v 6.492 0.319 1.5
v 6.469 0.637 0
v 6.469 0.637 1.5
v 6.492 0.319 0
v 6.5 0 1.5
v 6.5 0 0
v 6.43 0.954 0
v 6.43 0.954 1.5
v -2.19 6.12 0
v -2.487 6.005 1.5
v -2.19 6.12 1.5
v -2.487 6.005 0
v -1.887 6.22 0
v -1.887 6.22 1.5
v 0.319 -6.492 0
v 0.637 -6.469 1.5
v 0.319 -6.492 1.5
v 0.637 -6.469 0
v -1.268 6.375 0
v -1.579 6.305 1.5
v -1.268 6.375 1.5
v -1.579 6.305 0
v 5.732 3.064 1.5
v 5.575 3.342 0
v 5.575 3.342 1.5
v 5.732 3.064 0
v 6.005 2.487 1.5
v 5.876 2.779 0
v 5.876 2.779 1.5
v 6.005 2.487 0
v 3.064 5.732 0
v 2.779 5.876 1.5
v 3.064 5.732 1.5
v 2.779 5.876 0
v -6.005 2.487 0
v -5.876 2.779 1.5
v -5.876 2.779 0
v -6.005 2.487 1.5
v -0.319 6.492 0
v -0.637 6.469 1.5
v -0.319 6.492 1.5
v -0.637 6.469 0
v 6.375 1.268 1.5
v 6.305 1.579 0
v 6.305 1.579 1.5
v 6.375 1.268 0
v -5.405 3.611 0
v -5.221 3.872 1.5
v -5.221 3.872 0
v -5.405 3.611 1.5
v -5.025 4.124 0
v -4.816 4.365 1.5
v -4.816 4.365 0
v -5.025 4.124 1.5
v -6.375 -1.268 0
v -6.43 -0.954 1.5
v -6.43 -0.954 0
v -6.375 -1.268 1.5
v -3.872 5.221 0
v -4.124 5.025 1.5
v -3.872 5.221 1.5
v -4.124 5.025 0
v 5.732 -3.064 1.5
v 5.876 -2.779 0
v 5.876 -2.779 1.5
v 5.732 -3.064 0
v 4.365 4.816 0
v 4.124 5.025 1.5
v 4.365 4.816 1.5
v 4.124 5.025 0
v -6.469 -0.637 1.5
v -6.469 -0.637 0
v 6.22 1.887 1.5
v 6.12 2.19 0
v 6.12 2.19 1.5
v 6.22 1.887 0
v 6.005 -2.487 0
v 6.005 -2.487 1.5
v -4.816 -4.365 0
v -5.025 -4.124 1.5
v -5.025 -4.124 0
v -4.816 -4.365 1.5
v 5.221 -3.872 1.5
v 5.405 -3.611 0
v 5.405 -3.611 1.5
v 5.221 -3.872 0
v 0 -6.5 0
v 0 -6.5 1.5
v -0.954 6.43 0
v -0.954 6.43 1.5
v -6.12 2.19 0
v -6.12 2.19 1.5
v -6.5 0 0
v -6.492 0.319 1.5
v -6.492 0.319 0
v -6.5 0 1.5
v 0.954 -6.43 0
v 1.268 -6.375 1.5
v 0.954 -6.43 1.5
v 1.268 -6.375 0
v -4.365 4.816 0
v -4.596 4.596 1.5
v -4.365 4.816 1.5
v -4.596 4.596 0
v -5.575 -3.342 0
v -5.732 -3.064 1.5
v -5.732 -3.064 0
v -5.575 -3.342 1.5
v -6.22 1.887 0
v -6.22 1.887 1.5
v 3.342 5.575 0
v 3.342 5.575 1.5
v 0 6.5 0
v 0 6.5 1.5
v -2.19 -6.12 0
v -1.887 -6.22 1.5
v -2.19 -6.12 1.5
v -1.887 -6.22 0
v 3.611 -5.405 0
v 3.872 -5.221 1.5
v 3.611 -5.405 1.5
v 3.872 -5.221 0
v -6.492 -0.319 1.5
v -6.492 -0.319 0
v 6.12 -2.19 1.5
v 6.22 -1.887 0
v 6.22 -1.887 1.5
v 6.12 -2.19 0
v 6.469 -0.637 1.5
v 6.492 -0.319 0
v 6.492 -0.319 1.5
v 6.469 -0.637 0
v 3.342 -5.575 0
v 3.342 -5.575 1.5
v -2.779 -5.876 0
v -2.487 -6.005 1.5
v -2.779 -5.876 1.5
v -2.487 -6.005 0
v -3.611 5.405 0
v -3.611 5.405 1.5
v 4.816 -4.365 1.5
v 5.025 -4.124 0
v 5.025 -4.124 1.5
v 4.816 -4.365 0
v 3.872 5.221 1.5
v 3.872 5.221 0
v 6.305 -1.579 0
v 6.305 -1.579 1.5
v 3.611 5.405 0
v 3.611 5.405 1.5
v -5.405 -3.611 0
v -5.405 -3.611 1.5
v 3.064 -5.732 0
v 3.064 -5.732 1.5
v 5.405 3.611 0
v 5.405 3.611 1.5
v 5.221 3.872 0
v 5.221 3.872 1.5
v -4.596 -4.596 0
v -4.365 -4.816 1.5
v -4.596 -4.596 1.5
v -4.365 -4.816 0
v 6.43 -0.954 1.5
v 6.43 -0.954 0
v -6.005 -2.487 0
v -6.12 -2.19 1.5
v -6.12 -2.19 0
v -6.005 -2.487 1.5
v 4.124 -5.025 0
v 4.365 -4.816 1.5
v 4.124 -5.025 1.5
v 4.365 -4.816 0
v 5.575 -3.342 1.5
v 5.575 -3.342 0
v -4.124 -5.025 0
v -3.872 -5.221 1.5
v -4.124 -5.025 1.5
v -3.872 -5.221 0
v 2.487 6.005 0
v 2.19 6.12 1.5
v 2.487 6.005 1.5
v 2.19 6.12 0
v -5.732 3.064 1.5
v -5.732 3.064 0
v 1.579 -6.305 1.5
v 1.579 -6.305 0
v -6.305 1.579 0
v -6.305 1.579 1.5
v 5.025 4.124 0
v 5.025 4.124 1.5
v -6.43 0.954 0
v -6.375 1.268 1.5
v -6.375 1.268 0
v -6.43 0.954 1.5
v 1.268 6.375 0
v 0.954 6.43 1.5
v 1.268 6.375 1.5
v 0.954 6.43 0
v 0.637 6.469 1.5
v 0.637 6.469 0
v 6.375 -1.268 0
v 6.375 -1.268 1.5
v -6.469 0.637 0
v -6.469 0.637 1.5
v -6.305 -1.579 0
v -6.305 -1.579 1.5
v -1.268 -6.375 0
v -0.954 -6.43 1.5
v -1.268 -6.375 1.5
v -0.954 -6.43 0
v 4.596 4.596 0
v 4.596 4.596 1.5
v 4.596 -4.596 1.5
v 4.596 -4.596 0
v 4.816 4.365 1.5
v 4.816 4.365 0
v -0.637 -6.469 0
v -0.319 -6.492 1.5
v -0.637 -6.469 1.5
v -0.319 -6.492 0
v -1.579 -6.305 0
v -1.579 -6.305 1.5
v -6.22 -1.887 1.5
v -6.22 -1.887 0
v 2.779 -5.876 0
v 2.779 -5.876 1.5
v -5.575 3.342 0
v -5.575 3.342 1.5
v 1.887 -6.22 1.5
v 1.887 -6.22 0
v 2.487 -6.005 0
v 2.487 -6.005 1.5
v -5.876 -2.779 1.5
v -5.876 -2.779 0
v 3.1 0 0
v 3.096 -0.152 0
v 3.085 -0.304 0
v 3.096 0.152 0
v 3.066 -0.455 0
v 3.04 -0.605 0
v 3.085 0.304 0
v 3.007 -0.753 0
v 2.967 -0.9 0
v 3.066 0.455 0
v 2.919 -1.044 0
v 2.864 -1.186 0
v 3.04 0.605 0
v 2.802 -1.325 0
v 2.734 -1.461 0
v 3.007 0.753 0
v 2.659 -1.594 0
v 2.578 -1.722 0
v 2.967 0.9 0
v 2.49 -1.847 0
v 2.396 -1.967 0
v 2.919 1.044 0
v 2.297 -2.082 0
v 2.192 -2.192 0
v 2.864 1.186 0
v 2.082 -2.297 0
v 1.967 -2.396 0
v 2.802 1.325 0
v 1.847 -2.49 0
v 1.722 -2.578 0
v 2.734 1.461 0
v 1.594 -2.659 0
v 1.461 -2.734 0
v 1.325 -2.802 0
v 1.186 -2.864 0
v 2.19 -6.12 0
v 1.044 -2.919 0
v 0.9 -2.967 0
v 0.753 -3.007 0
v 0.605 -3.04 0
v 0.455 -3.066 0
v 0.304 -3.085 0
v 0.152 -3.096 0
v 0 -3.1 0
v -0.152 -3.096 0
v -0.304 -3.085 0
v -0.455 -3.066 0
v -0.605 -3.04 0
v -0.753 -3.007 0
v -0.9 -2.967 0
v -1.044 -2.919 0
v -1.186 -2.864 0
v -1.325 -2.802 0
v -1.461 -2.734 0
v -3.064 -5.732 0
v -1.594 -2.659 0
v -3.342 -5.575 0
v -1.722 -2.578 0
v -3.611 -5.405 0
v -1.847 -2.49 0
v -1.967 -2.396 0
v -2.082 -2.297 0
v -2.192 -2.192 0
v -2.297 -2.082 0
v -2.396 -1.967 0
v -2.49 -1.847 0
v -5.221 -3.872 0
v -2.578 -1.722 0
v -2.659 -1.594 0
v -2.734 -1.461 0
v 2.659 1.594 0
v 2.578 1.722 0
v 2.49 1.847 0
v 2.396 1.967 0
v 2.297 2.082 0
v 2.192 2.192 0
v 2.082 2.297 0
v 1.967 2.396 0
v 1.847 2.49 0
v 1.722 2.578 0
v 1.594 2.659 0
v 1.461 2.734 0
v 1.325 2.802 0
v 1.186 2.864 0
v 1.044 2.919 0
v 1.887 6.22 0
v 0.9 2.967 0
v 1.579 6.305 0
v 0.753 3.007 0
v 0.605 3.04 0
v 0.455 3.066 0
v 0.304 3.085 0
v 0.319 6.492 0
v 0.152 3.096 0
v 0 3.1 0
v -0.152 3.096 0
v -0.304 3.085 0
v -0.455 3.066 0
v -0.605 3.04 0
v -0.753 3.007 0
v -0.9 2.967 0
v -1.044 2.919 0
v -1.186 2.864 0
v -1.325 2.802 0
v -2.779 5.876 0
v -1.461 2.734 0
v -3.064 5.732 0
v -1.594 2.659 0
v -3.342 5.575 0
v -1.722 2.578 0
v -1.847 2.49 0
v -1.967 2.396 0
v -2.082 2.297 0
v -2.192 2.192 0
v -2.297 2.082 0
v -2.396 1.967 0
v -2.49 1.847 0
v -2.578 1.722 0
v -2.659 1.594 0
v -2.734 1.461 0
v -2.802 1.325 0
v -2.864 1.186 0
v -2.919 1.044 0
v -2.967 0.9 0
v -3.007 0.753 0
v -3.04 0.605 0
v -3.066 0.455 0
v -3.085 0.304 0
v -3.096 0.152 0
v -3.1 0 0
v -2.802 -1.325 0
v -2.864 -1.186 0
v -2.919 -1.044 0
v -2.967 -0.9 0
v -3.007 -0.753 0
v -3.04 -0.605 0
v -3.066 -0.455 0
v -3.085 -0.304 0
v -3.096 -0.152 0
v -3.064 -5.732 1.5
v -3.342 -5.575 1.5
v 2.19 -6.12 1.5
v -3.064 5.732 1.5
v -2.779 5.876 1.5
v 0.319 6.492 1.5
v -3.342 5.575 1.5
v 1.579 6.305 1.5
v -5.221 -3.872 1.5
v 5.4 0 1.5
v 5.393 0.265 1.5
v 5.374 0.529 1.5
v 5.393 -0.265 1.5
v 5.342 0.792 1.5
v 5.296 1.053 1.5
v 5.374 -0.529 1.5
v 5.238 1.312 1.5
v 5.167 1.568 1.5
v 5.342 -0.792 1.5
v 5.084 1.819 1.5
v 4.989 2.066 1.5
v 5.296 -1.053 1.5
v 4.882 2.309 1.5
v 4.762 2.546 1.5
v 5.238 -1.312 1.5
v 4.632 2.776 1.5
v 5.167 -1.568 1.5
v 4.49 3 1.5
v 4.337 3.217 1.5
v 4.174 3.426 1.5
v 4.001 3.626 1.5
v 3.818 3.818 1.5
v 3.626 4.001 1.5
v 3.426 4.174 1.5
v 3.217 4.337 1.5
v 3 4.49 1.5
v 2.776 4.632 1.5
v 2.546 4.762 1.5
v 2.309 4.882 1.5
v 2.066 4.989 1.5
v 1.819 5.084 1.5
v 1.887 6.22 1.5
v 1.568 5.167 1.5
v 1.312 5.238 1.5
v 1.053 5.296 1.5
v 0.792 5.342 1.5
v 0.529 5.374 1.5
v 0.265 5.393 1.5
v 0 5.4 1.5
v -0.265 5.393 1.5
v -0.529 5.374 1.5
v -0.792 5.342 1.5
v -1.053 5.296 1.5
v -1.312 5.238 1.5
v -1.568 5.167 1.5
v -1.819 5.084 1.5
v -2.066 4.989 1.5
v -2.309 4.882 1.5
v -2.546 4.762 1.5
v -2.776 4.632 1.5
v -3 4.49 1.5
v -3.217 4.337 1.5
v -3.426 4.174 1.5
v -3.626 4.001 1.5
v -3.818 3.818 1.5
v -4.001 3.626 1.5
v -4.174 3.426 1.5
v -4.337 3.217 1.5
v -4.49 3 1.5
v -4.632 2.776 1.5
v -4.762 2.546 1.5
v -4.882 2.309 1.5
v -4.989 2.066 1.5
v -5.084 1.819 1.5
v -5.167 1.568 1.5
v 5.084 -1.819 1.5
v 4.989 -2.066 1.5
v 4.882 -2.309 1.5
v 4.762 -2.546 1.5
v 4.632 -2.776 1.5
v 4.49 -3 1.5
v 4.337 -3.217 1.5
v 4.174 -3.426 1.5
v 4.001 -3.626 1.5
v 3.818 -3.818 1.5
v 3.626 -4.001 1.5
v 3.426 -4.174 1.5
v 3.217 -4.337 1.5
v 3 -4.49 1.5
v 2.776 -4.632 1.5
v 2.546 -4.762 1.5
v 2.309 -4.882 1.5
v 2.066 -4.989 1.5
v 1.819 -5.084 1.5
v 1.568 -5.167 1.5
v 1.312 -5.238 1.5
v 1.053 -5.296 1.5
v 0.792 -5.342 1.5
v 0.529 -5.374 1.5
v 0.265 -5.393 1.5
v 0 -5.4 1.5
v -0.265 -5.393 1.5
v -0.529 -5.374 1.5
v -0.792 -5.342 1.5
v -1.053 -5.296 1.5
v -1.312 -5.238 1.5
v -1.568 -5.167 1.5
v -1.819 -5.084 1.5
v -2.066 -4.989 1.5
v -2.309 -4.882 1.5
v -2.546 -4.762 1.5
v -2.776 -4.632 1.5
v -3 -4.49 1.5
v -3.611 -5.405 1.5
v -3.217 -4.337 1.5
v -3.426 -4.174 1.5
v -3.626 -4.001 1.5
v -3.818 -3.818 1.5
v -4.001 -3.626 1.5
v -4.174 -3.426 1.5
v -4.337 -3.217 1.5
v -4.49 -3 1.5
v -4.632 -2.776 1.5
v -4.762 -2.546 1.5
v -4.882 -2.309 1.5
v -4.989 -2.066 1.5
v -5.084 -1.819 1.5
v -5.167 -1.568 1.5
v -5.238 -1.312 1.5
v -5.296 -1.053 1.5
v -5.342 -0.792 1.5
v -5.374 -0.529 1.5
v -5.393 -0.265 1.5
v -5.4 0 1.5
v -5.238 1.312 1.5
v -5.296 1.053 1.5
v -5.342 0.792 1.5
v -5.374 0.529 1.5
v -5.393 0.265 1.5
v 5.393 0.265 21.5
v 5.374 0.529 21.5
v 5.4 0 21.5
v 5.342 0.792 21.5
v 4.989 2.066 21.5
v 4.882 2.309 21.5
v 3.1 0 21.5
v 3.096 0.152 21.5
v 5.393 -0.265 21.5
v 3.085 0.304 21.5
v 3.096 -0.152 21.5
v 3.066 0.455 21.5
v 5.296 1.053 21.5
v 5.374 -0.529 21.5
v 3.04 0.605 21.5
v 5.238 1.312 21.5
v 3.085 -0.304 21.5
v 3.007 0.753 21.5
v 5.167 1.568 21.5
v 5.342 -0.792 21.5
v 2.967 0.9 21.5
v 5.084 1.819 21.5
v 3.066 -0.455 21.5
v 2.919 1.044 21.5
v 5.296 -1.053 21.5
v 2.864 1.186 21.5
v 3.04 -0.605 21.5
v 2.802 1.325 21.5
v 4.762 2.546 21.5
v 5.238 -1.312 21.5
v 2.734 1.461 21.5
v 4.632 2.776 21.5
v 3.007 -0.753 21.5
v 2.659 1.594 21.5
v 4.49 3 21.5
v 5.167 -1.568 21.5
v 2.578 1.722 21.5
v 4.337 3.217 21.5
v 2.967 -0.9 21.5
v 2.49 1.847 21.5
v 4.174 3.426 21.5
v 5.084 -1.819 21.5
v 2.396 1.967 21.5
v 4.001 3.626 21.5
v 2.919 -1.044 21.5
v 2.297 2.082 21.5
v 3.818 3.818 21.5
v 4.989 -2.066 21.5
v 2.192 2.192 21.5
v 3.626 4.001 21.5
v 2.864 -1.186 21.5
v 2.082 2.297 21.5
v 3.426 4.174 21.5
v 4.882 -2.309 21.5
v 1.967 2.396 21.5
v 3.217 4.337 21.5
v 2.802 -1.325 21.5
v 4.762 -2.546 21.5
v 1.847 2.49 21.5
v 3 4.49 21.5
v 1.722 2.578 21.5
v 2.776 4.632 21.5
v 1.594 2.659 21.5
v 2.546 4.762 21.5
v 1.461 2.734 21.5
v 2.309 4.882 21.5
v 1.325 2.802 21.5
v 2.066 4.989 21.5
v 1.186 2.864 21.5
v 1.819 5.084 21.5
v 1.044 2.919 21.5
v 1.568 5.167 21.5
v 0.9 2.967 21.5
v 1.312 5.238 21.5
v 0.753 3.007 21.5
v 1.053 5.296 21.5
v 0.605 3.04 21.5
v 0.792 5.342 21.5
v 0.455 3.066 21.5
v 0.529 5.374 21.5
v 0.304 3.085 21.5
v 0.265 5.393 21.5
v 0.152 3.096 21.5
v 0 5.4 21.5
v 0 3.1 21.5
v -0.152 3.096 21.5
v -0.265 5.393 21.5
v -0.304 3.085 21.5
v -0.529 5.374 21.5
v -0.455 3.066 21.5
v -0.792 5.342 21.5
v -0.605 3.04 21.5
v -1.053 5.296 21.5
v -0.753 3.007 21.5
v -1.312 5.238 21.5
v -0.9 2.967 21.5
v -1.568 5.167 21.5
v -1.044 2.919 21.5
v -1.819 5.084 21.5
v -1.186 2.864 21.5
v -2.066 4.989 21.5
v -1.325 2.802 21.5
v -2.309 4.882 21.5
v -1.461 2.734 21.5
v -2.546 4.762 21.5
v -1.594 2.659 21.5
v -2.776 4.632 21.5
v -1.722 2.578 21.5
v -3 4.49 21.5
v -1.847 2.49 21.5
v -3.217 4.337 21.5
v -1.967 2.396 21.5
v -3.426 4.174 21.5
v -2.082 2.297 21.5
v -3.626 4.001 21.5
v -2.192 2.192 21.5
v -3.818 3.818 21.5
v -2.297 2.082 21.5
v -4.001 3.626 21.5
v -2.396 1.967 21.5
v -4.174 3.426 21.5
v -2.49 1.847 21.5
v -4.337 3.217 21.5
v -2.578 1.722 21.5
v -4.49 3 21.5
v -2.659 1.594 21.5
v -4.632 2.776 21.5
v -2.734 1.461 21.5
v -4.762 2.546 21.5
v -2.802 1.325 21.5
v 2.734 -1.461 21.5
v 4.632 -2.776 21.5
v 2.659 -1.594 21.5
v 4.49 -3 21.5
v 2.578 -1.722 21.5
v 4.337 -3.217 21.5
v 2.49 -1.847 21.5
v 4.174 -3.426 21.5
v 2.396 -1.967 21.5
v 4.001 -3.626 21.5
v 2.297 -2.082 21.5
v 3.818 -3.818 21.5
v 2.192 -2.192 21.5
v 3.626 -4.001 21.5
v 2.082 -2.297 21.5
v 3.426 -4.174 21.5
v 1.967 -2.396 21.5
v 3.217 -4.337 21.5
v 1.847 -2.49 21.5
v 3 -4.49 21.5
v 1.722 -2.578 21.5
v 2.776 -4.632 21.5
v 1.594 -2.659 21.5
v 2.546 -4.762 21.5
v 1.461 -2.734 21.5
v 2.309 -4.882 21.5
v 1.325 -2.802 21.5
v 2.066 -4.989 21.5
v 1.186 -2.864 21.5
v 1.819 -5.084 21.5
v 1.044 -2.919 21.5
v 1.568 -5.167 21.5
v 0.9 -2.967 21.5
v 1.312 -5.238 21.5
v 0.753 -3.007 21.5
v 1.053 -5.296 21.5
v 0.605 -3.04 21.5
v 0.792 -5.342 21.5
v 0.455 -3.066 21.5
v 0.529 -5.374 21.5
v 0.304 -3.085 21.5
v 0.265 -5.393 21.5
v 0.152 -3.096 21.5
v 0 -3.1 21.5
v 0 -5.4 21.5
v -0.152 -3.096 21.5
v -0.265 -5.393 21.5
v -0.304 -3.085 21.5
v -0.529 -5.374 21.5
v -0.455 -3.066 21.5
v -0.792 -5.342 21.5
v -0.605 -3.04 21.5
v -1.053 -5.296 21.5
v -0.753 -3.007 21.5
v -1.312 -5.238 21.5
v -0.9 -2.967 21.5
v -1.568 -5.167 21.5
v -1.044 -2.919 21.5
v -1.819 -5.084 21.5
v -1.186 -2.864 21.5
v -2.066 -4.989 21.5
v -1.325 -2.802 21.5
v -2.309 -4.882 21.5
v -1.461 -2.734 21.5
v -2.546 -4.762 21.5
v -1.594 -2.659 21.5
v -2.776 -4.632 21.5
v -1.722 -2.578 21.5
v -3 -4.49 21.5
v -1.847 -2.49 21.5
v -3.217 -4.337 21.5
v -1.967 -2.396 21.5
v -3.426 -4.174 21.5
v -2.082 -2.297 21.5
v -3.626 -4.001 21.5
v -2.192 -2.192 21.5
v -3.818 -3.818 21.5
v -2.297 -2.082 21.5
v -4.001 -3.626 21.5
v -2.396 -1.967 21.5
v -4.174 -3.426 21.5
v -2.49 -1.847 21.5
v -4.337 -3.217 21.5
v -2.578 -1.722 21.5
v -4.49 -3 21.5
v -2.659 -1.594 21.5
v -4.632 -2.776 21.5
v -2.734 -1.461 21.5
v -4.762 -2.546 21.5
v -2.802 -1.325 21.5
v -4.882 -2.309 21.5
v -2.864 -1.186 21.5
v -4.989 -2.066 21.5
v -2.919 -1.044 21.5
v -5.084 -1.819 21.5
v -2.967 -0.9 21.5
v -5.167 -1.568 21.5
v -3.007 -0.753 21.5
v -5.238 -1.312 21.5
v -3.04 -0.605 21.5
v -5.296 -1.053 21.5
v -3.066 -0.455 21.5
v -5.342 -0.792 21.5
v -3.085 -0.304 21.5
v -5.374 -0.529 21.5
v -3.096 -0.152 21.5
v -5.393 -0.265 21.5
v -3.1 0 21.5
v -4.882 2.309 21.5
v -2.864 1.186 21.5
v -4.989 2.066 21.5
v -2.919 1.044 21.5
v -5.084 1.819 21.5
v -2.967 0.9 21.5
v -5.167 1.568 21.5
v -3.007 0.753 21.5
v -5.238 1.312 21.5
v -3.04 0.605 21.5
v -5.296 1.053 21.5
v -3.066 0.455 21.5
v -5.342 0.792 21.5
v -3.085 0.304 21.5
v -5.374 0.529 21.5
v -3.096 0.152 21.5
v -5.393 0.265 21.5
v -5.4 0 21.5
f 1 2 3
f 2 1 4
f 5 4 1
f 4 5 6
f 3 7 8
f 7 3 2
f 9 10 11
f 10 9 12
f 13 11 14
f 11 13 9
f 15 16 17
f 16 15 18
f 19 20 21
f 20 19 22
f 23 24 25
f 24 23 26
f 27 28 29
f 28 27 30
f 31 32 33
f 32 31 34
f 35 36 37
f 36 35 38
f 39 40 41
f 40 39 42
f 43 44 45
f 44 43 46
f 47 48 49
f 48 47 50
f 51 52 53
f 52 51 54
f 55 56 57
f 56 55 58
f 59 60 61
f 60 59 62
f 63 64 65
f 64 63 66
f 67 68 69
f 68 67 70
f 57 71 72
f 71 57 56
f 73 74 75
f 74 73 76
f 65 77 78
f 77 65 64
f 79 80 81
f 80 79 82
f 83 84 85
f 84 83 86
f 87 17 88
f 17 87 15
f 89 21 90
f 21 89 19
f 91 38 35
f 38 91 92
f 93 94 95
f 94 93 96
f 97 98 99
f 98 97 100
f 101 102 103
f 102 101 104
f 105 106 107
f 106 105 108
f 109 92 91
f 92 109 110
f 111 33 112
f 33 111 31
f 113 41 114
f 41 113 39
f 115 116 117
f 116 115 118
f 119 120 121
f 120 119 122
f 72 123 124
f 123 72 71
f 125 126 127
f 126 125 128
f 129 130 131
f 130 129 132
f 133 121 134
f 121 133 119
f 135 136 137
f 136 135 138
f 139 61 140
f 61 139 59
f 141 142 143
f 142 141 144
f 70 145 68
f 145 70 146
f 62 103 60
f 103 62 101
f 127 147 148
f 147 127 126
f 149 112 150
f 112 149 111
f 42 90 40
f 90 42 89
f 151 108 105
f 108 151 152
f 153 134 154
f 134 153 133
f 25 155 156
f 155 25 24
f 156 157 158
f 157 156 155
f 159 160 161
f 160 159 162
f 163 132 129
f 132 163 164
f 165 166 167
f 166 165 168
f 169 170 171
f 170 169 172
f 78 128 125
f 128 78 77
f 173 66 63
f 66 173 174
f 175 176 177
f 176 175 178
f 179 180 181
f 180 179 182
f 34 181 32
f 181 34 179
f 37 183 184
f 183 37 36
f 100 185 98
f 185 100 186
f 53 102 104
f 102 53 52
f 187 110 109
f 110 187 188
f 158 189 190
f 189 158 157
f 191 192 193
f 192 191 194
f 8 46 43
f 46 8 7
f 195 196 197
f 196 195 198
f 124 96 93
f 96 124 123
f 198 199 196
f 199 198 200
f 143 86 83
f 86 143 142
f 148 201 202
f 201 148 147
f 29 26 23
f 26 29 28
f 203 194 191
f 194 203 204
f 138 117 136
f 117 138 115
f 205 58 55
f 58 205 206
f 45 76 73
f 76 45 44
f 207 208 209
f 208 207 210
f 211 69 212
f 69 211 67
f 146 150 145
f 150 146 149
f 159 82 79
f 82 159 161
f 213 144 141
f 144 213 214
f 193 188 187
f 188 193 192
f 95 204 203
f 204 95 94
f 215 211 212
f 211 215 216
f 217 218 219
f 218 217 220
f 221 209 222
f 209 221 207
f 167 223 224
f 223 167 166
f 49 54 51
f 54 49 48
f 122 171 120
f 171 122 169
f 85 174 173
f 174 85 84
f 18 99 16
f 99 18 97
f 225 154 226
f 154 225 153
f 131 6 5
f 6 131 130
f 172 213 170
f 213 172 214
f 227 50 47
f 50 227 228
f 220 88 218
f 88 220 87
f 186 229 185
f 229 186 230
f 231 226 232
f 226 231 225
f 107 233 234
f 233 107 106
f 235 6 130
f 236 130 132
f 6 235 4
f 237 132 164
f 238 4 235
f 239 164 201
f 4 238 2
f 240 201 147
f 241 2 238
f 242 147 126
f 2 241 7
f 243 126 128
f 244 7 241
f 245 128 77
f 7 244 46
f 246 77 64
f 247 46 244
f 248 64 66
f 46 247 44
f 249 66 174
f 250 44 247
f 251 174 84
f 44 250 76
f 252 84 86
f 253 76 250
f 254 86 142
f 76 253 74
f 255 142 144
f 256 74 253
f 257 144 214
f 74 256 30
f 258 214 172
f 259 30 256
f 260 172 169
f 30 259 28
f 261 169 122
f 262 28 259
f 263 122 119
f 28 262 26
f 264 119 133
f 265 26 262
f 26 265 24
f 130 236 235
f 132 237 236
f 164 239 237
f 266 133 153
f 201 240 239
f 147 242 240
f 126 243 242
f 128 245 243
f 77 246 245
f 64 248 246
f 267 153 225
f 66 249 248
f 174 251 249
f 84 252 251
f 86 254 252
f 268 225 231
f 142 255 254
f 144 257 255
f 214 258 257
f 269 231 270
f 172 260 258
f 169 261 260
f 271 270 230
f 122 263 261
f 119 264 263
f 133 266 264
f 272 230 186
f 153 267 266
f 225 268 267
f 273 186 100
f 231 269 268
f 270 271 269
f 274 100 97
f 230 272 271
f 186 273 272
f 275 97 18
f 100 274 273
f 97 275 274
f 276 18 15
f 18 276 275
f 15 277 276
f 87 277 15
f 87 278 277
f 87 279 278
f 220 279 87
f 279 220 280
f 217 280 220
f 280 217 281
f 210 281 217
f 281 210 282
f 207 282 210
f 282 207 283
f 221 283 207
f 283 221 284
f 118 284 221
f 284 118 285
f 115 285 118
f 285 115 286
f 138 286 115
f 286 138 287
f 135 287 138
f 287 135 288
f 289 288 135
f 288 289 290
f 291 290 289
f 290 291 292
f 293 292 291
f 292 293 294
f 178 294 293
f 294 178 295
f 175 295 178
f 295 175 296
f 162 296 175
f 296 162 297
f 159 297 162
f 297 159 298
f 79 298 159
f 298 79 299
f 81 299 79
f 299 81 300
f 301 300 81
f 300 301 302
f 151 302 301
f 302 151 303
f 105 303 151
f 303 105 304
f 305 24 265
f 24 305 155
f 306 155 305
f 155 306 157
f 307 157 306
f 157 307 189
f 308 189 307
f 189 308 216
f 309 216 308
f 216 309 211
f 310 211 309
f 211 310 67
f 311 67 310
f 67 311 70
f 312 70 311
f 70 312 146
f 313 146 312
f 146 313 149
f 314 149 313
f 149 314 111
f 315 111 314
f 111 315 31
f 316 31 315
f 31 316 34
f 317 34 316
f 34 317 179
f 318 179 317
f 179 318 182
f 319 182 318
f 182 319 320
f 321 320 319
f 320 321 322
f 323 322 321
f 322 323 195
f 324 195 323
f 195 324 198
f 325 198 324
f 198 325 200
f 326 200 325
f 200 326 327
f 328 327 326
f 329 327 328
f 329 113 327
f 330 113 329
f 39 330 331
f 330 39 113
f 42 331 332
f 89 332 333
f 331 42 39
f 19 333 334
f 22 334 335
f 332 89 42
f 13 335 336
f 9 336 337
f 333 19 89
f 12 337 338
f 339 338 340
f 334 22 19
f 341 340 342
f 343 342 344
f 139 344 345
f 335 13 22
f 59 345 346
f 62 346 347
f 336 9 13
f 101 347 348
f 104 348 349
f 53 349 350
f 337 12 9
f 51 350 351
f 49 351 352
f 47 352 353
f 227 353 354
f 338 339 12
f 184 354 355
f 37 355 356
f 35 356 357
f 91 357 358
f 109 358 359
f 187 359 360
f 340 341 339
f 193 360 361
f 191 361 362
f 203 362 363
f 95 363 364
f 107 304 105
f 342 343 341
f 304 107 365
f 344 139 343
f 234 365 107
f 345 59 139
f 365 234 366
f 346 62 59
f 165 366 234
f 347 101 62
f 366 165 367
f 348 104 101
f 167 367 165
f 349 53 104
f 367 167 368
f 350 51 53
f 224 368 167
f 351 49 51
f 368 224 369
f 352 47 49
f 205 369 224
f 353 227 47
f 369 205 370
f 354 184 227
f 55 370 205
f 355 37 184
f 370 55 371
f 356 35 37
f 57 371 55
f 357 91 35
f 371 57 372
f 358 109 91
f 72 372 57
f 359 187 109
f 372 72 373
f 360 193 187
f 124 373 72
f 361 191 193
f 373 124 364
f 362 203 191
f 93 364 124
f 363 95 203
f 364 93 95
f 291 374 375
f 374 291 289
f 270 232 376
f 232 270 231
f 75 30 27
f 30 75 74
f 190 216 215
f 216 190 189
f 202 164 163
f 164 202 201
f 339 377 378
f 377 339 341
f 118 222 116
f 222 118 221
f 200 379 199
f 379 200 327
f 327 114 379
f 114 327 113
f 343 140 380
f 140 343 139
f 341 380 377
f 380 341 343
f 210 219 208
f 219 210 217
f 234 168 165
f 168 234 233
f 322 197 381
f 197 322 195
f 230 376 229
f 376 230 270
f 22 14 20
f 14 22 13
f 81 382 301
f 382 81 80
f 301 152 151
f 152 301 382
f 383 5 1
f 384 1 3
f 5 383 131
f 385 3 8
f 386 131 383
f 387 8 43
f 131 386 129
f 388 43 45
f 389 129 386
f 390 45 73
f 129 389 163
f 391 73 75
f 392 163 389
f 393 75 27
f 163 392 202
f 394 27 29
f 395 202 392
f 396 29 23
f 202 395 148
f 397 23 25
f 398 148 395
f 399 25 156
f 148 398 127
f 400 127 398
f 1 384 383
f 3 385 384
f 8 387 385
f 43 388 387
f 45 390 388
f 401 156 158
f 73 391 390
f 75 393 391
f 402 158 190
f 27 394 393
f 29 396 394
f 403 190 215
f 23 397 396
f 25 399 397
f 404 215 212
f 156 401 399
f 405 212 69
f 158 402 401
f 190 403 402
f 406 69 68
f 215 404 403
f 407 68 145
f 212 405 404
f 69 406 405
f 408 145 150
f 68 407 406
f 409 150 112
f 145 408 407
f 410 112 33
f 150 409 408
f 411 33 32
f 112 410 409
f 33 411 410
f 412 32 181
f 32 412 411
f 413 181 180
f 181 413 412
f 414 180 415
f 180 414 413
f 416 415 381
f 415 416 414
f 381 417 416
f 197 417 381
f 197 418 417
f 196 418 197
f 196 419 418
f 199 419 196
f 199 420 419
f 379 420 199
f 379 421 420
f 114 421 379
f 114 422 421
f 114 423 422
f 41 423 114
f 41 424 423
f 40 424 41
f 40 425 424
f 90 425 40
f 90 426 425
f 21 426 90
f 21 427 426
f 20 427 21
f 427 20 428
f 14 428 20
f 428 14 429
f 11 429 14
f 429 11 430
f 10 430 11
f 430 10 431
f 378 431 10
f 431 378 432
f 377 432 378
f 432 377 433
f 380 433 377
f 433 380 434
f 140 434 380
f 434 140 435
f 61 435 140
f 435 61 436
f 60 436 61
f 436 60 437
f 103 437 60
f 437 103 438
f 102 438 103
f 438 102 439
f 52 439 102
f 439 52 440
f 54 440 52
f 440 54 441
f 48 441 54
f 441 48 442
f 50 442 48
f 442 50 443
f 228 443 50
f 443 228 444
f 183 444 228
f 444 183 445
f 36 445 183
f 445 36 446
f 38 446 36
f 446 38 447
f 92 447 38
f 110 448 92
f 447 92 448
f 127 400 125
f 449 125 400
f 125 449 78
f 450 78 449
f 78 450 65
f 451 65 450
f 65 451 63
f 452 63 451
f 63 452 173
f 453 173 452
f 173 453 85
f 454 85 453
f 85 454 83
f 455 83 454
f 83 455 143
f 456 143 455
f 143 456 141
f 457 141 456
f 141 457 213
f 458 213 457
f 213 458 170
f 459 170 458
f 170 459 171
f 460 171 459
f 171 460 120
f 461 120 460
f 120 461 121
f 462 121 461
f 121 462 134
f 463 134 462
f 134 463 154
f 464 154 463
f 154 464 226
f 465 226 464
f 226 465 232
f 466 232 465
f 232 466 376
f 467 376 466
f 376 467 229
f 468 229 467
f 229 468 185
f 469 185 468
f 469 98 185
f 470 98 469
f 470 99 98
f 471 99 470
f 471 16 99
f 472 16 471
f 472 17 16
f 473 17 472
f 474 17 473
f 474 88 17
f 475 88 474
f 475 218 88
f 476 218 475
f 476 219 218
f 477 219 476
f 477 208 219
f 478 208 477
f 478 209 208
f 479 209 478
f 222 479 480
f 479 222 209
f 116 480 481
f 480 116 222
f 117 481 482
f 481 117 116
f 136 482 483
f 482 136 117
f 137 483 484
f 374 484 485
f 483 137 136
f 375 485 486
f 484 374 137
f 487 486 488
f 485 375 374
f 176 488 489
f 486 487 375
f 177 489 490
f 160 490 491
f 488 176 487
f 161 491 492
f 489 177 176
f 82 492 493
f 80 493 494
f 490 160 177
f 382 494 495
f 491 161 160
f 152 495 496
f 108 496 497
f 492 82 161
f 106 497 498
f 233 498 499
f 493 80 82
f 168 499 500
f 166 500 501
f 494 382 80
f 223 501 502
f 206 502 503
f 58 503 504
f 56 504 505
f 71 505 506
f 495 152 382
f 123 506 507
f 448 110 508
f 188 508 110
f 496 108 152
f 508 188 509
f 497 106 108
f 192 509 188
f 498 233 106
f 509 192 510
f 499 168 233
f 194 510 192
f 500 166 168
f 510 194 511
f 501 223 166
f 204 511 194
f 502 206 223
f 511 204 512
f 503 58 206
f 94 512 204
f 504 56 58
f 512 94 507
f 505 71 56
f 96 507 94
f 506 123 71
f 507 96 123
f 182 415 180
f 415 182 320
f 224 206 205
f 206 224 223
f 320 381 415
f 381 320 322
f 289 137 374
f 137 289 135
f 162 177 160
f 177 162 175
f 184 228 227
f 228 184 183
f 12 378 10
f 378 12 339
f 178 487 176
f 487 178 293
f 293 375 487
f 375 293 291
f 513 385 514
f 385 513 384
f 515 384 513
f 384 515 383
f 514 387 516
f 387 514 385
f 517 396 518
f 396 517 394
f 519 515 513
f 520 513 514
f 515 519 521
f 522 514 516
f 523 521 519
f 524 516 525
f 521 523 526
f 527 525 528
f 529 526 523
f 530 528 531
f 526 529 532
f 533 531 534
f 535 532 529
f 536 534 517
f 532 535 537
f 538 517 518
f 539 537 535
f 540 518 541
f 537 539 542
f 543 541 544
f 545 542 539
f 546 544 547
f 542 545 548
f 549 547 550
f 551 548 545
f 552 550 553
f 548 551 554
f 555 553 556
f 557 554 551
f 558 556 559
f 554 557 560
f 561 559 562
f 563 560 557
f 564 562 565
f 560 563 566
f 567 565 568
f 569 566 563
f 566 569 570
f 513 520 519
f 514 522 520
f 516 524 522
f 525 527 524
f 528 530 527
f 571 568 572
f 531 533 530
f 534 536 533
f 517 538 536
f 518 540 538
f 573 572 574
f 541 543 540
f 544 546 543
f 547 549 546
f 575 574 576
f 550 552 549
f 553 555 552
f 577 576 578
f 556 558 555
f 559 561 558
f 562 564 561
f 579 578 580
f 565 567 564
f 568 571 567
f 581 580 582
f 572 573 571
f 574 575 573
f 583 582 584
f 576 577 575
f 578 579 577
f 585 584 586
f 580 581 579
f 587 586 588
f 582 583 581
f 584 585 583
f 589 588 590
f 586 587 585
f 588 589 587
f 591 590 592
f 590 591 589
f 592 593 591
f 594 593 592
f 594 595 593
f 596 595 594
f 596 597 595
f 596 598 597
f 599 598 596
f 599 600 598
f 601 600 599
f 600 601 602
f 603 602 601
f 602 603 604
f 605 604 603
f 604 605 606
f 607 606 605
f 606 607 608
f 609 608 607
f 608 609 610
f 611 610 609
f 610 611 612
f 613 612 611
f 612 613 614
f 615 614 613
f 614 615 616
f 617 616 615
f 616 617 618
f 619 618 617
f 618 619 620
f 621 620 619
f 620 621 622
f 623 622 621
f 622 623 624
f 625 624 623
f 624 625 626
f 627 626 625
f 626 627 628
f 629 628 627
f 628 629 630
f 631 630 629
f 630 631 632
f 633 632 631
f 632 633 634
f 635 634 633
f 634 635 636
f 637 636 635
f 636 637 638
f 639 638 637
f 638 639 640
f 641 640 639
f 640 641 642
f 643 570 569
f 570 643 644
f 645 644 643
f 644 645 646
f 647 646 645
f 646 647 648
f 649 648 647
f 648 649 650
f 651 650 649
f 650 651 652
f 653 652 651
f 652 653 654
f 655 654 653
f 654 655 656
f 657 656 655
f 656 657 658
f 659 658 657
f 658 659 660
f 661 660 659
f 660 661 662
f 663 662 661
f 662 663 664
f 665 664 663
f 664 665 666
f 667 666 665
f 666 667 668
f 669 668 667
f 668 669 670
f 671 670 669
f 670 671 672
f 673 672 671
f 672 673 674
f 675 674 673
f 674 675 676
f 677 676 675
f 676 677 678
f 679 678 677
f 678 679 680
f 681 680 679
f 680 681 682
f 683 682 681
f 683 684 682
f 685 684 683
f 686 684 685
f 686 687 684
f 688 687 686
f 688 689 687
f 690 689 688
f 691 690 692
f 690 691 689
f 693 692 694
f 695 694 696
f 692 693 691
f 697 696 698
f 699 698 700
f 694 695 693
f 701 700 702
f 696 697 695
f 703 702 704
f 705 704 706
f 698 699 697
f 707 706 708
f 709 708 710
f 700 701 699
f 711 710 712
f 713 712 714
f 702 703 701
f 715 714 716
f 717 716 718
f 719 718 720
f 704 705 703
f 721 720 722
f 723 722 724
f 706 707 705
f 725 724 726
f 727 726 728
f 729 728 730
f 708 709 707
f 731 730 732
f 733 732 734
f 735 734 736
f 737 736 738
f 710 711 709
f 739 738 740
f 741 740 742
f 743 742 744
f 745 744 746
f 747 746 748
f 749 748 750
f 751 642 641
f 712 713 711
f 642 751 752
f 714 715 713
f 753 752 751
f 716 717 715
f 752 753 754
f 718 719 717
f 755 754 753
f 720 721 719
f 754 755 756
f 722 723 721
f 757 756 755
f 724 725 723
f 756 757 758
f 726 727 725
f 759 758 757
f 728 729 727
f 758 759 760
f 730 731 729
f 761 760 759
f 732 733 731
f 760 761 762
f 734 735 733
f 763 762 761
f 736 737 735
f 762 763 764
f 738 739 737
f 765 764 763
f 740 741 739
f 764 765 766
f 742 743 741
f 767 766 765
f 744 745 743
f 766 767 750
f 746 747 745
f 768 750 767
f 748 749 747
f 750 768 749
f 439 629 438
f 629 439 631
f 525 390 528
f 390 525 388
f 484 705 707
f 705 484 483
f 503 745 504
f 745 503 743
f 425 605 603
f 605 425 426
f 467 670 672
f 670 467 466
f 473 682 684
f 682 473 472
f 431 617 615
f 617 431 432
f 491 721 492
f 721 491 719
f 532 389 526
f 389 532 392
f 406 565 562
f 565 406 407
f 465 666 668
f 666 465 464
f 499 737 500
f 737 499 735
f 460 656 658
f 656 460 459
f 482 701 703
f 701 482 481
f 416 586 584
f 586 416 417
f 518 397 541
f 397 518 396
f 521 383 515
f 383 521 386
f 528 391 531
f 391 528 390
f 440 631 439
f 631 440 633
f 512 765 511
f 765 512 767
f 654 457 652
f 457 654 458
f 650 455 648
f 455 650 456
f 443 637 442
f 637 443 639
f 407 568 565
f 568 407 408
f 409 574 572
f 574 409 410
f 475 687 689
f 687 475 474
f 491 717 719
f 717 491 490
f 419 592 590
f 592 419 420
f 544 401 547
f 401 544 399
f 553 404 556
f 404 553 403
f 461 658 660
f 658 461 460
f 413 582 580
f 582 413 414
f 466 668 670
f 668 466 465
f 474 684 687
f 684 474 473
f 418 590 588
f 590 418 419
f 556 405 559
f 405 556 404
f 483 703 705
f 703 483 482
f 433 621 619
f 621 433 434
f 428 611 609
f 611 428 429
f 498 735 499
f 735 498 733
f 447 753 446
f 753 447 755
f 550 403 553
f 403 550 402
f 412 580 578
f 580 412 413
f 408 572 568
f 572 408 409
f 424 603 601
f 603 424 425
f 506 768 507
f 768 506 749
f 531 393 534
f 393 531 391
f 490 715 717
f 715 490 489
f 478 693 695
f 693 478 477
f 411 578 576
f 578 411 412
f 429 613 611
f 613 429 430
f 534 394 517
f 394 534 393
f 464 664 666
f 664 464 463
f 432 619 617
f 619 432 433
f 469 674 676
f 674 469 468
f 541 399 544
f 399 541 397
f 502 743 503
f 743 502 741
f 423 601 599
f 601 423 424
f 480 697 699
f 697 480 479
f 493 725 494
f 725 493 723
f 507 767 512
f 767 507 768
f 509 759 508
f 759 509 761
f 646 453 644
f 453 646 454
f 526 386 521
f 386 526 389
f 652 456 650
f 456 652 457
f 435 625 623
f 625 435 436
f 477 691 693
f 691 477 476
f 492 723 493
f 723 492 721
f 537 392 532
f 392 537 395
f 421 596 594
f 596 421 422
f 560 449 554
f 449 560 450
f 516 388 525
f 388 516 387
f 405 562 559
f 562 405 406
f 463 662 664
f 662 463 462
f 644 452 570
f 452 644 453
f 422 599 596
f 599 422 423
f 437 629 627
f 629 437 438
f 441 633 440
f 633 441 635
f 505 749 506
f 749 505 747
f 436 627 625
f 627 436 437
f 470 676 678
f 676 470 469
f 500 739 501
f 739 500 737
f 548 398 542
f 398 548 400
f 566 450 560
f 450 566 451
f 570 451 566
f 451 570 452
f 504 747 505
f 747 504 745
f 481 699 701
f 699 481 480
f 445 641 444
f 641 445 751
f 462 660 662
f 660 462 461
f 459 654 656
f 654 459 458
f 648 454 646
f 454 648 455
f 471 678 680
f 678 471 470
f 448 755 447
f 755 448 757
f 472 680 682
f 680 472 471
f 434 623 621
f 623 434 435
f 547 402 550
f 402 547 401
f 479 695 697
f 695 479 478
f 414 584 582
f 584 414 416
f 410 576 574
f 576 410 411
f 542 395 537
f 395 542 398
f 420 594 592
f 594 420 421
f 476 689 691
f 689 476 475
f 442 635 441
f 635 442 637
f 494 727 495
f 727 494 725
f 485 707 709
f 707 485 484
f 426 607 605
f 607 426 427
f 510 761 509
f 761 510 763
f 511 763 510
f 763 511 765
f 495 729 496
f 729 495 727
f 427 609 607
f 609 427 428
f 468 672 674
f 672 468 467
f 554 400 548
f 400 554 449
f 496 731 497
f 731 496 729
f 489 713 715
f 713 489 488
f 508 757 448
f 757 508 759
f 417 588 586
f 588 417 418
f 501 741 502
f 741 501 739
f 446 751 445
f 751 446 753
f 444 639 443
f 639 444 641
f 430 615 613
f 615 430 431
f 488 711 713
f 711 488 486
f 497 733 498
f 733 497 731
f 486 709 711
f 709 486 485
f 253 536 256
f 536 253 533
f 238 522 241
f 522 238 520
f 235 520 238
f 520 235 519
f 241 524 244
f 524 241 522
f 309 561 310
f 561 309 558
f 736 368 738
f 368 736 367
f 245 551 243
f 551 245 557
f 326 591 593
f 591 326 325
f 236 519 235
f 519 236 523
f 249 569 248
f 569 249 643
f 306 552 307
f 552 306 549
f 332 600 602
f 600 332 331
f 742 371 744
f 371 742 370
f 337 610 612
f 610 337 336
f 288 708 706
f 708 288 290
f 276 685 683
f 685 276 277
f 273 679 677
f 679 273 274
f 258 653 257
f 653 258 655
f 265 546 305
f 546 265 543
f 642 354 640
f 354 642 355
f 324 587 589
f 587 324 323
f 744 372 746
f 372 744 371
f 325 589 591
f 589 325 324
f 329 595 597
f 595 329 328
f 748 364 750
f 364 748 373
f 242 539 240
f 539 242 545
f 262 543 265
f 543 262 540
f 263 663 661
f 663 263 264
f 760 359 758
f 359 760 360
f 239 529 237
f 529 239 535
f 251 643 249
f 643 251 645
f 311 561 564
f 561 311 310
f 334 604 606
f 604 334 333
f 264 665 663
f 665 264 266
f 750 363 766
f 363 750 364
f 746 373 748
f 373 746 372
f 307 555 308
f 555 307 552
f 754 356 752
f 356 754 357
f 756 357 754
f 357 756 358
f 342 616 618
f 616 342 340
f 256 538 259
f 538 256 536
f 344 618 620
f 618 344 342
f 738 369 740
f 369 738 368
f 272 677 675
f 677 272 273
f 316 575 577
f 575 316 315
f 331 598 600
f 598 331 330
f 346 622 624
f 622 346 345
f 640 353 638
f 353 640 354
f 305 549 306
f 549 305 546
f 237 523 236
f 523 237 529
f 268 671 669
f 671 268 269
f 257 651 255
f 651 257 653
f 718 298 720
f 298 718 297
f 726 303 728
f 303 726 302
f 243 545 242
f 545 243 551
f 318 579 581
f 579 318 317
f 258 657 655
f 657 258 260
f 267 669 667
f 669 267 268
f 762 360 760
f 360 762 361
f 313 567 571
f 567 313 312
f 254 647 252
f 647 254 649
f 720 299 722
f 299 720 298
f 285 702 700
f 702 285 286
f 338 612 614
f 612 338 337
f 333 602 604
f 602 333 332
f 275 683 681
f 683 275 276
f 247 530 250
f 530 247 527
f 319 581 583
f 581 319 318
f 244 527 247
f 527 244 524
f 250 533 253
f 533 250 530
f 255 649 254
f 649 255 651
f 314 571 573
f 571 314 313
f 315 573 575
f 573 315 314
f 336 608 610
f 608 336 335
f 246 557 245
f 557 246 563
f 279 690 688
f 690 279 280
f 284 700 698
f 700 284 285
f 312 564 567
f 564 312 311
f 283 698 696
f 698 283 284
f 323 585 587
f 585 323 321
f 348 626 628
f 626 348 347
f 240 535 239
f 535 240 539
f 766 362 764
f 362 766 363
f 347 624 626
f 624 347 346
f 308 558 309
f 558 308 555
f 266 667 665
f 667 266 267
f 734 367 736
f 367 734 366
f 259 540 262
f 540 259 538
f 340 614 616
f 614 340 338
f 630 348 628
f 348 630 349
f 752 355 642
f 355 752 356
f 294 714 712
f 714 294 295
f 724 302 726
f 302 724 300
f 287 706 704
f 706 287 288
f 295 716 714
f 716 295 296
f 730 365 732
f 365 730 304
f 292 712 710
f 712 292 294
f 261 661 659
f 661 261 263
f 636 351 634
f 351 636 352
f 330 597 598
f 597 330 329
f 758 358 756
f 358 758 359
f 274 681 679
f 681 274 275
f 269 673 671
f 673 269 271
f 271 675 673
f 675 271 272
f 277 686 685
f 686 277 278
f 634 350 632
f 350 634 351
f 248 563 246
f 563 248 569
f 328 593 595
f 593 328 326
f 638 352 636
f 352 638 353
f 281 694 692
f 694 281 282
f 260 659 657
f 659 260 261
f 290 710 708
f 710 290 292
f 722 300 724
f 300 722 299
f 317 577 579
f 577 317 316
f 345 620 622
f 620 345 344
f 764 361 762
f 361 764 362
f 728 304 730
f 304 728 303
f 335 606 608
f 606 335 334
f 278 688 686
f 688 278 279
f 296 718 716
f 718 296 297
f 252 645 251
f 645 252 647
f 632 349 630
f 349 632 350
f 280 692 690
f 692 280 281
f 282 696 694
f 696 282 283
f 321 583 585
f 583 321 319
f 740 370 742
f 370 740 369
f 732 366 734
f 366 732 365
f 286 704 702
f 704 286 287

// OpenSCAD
// Adapter sleeve for 0.2 mL PCR tubes in 1.5 mL rack holes.
// Designed to be printed upside down (collar on the bed).

// Dimensions
collar_d = 13.0;      // Diameter of the base collar
collar_t = 1.5;       // Thickness of the base collar
sleeve_d = 10.8;      // Outer diameter of the sleeve body
total_h  = 21.5;      // Total height of the part
bore_d   = 6.2;       // Diameter of the central bore

// Resolution
$fn = 128;

// The part is built from z=0 upwards.
difference() {
    // --- Solid Body ---
    union() {
        // Base collar
        cylinder(h = collar_t, d = collar_d);
        
        // Sleeve body rising from the collar
        // Height of sleeve = total height - collar thickness
        translate([0, 0, collar_t])
            cylinder(h = total_h - collar_t, d = sleeve_d);
    }

    // --- Bore ---
    // A straight 6.2 mm diameter bore runs through the full height, open at both ends.
    // We extend the cylinder slightly beyond the boundaries to ensure a clean cut.
    translate([0, 0, -1])
        cylinder(h = total_h + 2, d = bore_d);
}
